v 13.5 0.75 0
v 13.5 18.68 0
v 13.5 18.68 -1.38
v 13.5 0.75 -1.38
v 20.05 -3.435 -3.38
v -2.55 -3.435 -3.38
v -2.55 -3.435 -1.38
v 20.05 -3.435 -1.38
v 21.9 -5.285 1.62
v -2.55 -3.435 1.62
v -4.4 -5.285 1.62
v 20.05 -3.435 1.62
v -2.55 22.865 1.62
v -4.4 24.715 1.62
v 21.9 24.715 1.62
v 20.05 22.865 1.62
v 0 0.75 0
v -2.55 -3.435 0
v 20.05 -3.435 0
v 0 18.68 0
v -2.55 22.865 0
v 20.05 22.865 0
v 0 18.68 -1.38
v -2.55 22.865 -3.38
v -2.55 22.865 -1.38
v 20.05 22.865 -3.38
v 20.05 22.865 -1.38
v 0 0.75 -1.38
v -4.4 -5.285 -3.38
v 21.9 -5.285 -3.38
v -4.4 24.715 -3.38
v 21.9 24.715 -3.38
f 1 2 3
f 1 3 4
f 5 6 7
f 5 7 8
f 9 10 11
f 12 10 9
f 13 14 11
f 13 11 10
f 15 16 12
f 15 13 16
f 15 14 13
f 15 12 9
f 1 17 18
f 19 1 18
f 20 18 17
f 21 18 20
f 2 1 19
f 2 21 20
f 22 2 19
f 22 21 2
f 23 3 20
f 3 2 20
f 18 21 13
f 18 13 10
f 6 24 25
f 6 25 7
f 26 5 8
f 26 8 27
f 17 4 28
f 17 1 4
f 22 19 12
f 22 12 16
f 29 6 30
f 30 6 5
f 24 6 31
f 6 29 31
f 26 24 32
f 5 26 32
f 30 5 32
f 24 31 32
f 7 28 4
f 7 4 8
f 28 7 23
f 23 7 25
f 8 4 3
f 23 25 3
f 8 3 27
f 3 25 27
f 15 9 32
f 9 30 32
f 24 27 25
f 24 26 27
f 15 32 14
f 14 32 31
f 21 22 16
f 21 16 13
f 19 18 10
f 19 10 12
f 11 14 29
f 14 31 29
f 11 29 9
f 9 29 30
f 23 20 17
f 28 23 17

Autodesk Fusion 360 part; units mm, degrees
sketch "Sketch1" plane through (0, 0, 0) normal (0, 0, 1) x (1, 0, 0)
  line L0 (0, 0) -> (16.5, 0)
  line L1 (16.5, 0) -> (16.5, 19.43)
  line L2 (16.5, 19.43) -> (0, 19.43)
  line L3 (0, 19.43) -> (0, 0)
  line L4 (0, 19.43) -> (1.2, 19.43)
  line L5 (1.2, 0) -> (0, 0)
  line L6 (0, 0) -> (0, 19.43)
  line L7 (16.5, 19.43) -> (13.5, 19.43)
  line L8 (13.5, 19.43) -> (13.5, 0)
  line L9 (13.5, 0) -> (16.5, 0)
  line L10 (16.5, 0) -> (16.5, 19.43)
  line L11 (-4.4, -5.285) -> (21.9, -5.285)
  line L12 (21.9, -5.285) -> (21.9, 24.715)
  line L13 (21.9, 24.715) -> (-4.4, 24.715)
  line L14 (-4.4, 24.715) -> (-4.4, -5.285)
  line L15 (0, 0) -> (13.5, 0)
  line L16 (13.5, 0) -> (13.5, 0.75)
  line L17 (13.5, 0.75) -> (0, 0.75)
  line L18 (0, 0.75) -> (0, 0)
  line L19 (0, 19.43) -> (13.5, 19.43)
  line L20 (13.5, 19.43) -> (13.5, 18.68)
  line L21 (13.5, 18.68) -> (0, 18.68)
  line L22 (0, 18.68) -> (0, 19.43)
  line L23 (-2.55, -3.435) -> (20.05, -3.435)
  line L24 (20.05, -3.435) -> (20.05, 22.865)
  line L25 (20.05, 22.865) -> (-2.55, 22.865)
  line L26 (-2.55, 22.865) -> (-2.55, -3.435)
  dimension "d1" = 16.5
  dimension "d2" = 19.43
  dimension "d4" = 3
  dimension "d9" = 4.4
  dimension "d49" = 0.75
  dimension "d50" = 0.75
  dimension "d53" = 30
  dimension "d54" = 5.285
  dimension "d55" = 1.85
  dimension "d56" = 1.85
  dimension "d57" = 1.85
  dimension "d58" = 1.85
  dimension "d71" = 5.4
  dimension "d72" = 25.3
extrude "Extrude14" add sketch "Sketch1" along normal blind 1.62 contours L11 L12 L13 L14
extrude "Extrude15" add sketch "Sketch1" against normal blind 3.38 contours L11 L12 L13 L14
extrude "Extrude16" add sketch "Sketch1" against normal blind 1.38 contours L0 L3 L5 L6 L8 L15 L16 L17 L18 | L0 L1 L2 L7 L8 L9 L10 L16 L20 | L2 L3 L4 L6 L8 L19 L20 L21 L22 | L23 L24 L25 L26
equation "d32 = ( 16.50 mm - d27 ) / 2"
equation "d49 = d50"
equation "d54 = ( d53 - d2 ) / 2"
equation "d56 = d55"
equation "d57 = d55"
equation "d58 = d55"
equation "d80 = -1.38 mm"
equation "d24 = 3.2 mm"
equation "d25 = d24"
equation "d26 = 10 mm"
equation "d27 = ( 30 mm - d26 ) / 2"
equation "d29 = ( 6.4 / sin(45 °) ) * 1 mm"
equation "d81 = d80 / 2"
